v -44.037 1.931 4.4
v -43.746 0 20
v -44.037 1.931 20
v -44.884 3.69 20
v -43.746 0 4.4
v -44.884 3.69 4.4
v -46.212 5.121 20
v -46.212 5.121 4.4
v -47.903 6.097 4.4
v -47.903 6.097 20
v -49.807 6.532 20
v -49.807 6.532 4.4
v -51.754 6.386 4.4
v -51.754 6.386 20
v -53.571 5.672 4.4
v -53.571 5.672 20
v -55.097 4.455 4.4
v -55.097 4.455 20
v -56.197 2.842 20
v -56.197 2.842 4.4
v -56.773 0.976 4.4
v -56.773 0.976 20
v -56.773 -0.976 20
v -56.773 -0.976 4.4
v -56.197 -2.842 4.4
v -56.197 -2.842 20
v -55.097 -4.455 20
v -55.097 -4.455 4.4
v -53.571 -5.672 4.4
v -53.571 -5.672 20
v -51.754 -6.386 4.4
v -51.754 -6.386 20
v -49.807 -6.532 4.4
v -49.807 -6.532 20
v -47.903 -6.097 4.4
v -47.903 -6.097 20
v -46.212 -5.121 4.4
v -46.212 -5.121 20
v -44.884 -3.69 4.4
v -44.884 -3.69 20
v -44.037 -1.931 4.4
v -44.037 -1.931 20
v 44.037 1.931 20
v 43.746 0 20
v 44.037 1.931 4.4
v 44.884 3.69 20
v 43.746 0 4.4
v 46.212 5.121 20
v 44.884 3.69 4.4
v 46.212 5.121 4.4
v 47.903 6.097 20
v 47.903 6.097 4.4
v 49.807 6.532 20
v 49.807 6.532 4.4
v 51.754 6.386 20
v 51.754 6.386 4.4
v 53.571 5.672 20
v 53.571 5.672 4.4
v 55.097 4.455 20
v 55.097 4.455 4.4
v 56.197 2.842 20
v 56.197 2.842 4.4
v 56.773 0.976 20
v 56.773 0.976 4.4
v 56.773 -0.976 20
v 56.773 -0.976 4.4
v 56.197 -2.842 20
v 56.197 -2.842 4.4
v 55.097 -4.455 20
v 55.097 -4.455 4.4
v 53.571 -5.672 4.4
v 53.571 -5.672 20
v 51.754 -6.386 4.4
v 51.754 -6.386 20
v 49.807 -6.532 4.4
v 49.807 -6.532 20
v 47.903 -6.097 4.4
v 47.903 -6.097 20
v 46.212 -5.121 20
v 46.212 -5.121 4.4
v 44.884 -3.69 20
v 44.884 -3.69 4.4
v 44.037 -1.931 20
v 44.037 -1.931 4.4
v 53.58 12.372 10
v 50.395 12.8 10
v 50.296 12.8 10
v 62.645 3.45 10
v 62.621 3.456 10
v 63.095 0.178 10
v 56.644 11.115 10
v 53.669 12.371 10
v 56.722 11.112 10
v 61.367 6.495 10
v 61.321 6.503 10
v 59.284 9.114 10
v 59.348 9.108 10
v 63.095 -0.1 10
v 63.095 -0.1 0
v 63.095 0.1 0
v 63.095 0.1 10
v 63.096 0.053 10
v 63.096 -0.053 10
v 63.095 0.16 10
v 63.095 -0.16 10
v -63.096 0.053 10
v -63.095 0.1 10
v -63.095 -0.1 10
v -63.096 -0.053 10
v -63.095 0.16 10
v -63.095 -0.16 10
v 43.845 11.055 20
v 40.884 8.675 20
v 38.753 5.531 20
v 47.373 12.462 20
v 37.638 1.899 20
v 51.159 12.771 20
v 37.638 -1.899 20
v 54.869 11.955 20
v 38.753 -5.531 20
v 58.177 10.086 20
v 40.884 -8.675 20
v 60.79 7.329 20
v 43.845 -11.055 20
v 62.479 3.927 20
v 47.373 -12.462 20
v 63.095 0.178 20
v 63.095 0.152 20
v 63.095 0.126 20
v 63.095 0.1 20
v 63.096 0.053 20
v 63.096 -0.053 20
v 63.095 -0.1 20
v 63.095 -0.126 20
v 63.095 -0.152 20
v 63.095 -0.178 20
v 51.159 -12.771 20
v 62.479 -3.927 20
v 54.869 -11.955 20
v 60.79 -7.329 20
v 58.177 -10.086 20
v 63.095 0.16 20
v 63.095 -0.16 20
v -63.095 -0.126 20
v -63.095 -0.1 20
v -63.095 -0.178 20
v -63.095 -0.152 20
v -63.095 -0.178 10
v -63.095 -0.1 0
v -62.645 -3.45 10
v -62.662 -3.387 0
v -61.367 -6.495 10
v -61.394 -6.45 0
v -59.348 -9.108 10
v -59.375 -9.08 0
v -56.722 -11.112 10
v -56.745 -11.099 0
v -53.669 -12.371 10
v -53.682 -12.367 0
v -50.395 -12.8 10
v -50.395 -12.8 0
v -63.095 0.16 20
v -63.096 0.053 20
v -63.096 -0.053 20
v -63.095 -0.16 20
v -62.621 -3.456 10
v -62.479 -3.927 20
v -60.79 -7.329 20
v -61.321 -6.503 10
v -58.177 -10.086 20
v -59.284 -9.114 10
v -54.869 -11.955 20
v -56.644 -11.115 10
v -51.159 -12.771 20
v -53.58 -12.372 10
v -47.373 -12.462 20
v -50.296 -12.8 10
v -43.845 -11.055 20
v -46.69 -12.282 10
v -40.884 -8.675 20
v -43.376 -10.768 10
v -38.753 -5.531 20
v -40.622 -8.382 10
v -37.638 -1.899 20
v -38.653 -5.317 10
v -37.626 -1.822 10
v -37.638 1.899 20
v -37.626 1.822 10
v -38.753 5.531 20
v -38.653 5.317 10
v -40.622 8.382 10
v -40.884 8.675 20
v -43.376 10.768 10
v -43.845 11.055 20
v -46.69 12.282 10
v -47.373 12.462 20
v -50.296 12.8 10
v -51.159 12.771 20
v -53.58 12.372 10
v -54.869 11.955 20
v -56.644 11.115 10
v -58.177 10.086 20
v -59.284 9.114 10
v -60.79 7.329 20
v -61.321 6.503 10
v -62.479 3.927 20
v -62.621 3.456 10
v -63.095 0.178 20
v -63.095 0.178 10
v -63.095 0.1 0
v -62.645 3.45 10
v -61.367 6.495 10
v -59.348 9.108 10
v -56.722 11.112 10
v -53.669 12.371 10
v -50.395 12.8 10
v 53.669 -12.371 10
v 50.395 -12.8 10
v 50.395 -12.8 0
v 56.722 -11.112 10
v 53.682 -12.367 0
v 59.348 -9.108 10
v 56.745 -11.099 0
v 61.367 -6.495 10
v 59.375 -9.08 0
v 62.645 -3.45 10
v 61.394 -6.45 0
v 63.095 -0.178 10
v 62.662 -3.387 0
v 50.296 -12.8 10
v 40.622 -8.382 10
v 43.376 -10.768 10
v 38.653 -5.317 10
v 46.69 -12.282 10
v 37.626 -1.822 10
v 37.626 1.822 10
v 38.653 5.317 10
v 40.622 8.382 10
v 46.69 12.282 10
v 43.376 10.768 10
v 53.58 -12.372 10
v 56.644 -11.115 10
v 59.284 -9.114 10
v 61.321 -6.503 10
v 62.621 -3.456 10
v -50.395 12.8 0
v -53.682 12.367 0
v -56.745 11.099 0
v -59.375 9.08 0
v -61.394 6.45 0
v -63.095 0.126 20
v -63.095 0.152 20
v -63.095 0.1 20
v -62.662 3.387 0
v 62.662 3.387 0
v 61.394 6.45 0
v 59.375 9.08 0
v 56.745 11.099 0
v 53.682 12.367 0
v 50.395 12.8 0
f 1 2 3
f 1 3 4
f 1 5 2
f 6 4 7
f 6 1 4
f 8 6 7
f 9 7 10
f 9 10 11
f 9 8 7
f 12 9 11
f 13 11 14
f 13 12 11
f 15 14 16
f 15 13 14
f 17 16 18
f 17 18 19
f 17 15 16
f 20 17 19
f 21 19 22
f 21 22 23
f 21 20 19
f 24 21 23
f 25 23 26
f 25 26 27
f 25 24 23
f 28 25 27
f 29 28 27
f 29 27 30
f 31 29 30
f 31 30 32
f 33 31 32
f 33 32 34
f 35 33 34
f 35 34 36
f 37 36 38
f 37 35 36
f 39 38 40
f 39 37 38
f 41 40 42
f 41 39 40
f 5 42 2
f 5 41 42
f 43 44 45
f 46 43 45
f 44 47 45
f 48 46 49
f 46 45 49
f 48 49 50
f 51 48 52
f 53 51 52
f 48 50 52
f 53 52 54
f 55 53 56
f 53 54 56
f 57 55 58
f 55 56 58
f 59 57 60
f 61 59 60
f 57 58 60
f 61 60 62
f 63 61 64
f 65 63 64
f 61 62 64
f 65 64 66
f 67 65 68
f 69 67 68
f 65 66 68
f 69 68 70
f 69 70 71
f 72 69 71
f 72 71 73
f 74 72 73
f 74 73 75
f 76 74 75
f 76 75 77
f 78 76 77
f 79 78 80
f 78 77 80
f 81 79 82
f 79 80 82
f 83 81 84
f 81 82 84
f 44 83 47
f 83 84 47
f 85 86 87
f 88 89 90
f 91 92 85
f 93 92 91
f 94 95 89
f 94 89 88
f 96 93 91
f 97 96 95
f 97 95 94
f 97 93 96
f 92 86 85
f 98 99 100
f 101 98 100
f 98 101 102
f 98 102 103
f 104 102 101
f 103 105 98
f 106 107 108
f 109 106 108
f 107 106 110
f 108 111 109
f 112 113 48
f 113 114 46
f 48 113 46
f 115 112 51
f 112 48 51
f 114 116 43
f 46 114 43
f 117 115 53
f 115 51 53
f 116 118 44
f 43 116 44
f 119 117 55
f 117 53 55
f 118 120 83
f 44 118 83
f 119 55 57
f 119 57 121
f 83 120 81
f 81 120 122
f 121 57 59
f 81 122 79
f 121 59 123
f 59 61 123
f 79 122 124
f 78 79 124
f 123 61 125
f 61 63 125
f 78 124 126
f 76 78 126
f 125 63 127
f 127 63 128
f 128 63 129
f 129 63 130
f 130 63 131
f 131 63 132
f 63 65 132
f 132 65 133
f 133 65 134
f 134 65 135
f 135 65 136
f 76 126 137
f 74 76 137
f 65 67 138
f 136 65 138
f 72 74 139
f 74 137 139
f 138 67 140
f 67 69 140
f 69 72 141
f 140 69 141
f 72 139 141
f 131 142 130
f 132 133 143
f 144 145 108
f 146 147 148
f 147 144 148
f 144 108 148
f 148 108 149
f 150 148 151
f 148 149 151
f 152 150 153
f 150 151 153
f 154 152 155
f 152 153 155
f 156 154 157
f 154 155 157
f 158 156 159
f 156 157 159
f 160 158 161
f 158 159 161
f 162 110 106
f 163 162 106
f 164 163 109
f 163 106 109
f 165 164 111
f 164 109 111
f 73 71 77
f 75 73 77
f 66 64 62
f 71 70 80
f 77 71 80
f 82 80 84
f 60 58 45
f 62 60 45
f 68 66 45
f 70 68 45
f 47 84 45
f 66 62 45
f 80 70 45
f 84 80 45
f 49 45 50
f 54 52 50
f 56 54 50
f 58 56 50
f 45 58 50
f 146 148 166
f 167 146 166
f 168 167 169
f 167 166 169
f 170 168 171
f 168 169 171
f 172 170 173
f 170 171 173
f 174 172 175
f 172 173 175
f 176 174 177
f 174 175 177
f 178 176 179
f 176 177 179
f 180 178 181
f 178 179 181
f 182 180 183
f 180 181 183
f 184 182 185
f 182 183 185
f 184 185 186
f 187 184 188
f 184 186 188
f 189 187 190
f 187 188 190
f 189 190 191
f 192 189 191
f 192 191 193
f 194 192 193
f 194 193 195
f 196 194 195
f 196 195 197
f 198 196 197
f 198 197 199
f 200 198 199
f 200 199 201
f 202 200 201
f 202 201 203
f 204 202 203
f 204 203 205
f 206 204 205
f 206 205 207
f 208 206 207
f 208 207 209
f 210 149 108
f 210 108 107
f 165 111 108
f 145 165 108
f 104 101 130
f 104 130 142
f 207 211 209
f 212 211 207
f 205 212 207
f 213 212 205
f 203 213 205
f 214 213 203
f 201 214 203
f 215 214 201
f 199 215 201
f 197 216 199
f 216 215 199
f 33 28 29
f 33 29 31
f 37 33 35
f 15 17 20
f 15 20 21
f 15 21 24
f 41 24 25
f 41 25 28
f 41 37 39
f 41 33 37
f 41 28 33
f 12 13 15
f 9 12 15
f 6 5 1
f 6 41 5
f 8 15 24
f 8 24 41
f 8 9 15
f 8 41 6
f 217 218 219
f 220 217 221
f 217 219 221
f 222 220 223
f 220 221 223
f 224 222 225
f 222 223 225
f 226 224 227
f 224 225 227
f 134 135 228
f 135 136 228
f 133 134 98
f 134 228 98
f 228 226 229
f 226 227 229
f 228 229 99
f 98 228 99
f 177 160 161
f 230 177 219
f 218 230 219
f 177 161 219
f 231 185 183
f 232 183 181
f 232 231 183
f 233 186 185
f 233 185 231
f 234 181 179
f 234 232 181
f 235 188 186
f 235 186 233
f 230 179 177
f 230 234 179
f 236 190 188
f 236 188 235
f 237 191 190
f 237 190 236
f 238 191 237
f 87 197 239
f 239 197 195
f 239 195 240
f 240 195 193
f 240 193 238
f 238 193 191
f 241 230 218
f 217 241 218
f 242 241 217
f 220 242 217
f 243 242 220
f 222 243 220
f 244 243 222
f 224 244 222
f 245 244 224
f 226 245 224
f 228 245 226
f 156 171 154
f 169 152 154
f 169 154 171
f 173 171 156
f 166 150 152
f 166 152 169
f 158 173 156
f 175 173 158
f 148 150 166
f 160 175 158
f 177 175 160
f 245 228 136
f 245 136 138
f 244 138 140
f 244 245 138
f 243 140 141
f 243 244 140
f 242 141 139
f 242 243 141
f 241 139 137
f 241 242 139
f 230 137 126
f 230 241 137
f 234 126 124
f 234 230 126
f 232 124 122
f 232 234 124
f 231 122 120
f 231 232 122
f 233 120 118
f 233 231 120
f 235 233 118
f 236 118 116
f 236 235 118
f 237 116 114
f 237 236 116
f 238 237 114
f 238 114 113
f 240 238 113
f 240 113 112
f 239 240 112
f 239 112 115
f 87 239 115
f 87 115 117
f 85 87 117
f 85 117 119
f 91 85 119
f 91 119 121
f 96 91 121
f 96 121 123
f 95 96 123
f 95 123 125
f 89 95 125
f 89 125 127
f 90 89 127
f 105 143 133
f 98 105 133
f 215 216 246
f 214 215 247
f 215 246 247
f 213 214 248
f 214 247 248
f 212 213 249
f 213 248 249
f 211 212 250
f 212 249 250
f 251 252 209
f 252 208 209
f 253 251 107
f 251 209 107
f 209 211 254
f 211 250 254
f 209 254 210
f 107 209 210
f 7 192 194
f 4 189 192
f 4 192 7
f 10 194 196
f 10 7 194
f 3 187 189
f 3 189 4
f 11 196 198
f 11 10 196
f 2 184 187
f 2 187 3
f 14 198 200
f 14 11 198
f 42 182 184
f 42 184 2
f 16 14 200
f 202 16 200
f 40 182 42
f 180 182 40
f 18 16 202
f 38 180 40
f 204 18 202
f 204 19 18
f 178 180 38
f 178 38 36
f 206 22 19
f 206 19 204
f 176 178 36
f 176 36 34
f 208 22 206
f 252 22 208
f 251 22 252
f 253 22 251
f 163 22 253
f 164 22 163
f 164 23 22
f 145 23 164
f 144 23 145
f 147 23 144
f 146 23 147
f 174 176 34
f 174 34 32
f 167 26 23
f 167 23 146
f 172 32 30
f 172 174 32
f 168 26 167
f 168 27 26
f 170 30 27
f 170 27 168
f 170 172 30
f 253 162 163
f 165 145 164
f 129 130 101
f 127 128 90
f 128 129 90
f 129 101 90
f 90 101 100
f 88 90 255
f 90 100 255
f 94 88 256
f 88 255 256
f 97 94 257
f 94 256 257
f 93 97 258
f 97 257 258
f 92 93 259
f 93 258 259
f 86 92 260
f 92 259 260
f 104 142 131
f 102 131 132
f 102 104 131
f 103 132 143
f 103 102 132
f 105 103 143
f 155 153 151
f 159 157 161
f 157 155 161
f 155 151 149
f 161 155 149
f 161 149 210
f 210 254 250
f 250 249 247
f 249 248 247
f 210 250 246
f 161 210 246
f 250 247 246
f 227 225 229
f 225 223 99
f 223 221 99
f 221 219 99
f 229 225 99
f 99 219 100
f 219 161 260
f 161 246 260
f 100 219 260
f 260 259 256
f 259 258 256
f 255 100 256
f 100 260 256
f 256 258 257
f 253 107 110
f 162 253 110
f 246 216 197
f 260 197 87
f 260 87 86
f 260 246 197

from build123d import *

# Parameters (mm, degrees)
SKETCH2_W           = 126.19
SKETCH2_H           = 25.6
BOSS_EXTRUDE1_DEPTH = 10
SKETCH3_R           = 12.8
SKETCH3_R_2         = 6.55
BOSS_EXTRUDE2_DEPTH = 10
FILLET2_R           = 12.7
CUT_EXTRUDE1_START  = -5.6
SKETCH4_R           = 6.55
CUT_EXTRUDE1_DEPTH  = 5.6


with BuildPart() as part:
    # Sketch2 → Boss-Extrude1 (new body)
    with BuildSketch(Plane.XY):
        Rectangle(SKETCH2_W, SKETCH2_H)
    extrude(amount=BOSS_EXTRUDE1_DEPTH)

    # Sketch3 → Boss-Extrude2 (add)
    with BuildSketch(Plane.XY.offset(10)):
        with Locations(Location((-50.296, 0, 0), (0, 0, 179.283798093))):
            Circle(SKETCH3_R)
        with Locations((-50.296, 0)):
            Circle(SKETCH3_R_2, mode=Mode.SUBTRACT)
    boss_extrude2 = extrude(amount=BOSS_EXTRUDE2_DEPTH)

    # Mirror1: Boss-Extrude2 across plane
    add(boss_extrude2.mirror(Plane(origin=(0, 0, 0), x_dir=(0, 0, 1), z_dir=(1, 0, 0))))

    # Fillet2
    # the kernel refuses this fillet: 12.7 mm, written as the material it takes off along each edge
    with BuildSketch(Plane(origin=(-63.095, -12.8, -31.75), x_dir=(0, 1, 0), z_dir=(0, 0, 1)), Plane(origin=(-63.095, 12.8, -31.75), x_dir=(1, 0, 0), z_dir=(0, 0, 1))) as fillet2_piece_1:
        with BuildLine():
            CenterArc((FILLET2_R, -FILLET2_R), FILLET2_R, 90, 90)
            Line((0, -FILLET2_R), (0, 0))
            Line((0, 0), (FILLET2_R, 0))
        make_face()
    extrude(amount=73.5, mode=Mode.SUBTRACT)
    with BuildSketch(Plane(origin=(63.095, -12.8, -31.75), x_dir=(0, 1, 0), z_dir=(0, 0, 1)), Plane(origin=(63.095, 12.8, -31.75), x_dir=(-1, 0, 0), z_dir=(0, 0, 1))) as fillet2_piece_2:
        with BuildLine():
            CenterArc((FILLET2_R, FILLET2_R), FILLET2_R, 180, 90)
            Line((0, FILLET2_R), (0, 0))
            Line((0, 0), (FILLET2_R, 0))
        make_face()
    extrude(amount=73.5, mode=Mode.SUBTRACT)

    # Sketch4 → Cut-Extrude1 (cut)
    with BuildSketch(Plane.XY.offset(10).offset(CUT_EXTRUDE1_START)):
        with Locations((-50.296, 0)):
            Circle(SKETCH4_R)
    cut_extrude1 = extrude(amount=CUT_EXTRUDE1_DEPTH, mode=Mode.SUBTRACT)

    # Mirror2: Cut-Extrude1 across plane
    add(cut_extrude1.mirror(Plane(origin=(0, 0, 0), x_dir=(0, 0, 1), z_dir=(1, 0, 0))), mode=Mode.SUBTRACT)


solid = part.part
